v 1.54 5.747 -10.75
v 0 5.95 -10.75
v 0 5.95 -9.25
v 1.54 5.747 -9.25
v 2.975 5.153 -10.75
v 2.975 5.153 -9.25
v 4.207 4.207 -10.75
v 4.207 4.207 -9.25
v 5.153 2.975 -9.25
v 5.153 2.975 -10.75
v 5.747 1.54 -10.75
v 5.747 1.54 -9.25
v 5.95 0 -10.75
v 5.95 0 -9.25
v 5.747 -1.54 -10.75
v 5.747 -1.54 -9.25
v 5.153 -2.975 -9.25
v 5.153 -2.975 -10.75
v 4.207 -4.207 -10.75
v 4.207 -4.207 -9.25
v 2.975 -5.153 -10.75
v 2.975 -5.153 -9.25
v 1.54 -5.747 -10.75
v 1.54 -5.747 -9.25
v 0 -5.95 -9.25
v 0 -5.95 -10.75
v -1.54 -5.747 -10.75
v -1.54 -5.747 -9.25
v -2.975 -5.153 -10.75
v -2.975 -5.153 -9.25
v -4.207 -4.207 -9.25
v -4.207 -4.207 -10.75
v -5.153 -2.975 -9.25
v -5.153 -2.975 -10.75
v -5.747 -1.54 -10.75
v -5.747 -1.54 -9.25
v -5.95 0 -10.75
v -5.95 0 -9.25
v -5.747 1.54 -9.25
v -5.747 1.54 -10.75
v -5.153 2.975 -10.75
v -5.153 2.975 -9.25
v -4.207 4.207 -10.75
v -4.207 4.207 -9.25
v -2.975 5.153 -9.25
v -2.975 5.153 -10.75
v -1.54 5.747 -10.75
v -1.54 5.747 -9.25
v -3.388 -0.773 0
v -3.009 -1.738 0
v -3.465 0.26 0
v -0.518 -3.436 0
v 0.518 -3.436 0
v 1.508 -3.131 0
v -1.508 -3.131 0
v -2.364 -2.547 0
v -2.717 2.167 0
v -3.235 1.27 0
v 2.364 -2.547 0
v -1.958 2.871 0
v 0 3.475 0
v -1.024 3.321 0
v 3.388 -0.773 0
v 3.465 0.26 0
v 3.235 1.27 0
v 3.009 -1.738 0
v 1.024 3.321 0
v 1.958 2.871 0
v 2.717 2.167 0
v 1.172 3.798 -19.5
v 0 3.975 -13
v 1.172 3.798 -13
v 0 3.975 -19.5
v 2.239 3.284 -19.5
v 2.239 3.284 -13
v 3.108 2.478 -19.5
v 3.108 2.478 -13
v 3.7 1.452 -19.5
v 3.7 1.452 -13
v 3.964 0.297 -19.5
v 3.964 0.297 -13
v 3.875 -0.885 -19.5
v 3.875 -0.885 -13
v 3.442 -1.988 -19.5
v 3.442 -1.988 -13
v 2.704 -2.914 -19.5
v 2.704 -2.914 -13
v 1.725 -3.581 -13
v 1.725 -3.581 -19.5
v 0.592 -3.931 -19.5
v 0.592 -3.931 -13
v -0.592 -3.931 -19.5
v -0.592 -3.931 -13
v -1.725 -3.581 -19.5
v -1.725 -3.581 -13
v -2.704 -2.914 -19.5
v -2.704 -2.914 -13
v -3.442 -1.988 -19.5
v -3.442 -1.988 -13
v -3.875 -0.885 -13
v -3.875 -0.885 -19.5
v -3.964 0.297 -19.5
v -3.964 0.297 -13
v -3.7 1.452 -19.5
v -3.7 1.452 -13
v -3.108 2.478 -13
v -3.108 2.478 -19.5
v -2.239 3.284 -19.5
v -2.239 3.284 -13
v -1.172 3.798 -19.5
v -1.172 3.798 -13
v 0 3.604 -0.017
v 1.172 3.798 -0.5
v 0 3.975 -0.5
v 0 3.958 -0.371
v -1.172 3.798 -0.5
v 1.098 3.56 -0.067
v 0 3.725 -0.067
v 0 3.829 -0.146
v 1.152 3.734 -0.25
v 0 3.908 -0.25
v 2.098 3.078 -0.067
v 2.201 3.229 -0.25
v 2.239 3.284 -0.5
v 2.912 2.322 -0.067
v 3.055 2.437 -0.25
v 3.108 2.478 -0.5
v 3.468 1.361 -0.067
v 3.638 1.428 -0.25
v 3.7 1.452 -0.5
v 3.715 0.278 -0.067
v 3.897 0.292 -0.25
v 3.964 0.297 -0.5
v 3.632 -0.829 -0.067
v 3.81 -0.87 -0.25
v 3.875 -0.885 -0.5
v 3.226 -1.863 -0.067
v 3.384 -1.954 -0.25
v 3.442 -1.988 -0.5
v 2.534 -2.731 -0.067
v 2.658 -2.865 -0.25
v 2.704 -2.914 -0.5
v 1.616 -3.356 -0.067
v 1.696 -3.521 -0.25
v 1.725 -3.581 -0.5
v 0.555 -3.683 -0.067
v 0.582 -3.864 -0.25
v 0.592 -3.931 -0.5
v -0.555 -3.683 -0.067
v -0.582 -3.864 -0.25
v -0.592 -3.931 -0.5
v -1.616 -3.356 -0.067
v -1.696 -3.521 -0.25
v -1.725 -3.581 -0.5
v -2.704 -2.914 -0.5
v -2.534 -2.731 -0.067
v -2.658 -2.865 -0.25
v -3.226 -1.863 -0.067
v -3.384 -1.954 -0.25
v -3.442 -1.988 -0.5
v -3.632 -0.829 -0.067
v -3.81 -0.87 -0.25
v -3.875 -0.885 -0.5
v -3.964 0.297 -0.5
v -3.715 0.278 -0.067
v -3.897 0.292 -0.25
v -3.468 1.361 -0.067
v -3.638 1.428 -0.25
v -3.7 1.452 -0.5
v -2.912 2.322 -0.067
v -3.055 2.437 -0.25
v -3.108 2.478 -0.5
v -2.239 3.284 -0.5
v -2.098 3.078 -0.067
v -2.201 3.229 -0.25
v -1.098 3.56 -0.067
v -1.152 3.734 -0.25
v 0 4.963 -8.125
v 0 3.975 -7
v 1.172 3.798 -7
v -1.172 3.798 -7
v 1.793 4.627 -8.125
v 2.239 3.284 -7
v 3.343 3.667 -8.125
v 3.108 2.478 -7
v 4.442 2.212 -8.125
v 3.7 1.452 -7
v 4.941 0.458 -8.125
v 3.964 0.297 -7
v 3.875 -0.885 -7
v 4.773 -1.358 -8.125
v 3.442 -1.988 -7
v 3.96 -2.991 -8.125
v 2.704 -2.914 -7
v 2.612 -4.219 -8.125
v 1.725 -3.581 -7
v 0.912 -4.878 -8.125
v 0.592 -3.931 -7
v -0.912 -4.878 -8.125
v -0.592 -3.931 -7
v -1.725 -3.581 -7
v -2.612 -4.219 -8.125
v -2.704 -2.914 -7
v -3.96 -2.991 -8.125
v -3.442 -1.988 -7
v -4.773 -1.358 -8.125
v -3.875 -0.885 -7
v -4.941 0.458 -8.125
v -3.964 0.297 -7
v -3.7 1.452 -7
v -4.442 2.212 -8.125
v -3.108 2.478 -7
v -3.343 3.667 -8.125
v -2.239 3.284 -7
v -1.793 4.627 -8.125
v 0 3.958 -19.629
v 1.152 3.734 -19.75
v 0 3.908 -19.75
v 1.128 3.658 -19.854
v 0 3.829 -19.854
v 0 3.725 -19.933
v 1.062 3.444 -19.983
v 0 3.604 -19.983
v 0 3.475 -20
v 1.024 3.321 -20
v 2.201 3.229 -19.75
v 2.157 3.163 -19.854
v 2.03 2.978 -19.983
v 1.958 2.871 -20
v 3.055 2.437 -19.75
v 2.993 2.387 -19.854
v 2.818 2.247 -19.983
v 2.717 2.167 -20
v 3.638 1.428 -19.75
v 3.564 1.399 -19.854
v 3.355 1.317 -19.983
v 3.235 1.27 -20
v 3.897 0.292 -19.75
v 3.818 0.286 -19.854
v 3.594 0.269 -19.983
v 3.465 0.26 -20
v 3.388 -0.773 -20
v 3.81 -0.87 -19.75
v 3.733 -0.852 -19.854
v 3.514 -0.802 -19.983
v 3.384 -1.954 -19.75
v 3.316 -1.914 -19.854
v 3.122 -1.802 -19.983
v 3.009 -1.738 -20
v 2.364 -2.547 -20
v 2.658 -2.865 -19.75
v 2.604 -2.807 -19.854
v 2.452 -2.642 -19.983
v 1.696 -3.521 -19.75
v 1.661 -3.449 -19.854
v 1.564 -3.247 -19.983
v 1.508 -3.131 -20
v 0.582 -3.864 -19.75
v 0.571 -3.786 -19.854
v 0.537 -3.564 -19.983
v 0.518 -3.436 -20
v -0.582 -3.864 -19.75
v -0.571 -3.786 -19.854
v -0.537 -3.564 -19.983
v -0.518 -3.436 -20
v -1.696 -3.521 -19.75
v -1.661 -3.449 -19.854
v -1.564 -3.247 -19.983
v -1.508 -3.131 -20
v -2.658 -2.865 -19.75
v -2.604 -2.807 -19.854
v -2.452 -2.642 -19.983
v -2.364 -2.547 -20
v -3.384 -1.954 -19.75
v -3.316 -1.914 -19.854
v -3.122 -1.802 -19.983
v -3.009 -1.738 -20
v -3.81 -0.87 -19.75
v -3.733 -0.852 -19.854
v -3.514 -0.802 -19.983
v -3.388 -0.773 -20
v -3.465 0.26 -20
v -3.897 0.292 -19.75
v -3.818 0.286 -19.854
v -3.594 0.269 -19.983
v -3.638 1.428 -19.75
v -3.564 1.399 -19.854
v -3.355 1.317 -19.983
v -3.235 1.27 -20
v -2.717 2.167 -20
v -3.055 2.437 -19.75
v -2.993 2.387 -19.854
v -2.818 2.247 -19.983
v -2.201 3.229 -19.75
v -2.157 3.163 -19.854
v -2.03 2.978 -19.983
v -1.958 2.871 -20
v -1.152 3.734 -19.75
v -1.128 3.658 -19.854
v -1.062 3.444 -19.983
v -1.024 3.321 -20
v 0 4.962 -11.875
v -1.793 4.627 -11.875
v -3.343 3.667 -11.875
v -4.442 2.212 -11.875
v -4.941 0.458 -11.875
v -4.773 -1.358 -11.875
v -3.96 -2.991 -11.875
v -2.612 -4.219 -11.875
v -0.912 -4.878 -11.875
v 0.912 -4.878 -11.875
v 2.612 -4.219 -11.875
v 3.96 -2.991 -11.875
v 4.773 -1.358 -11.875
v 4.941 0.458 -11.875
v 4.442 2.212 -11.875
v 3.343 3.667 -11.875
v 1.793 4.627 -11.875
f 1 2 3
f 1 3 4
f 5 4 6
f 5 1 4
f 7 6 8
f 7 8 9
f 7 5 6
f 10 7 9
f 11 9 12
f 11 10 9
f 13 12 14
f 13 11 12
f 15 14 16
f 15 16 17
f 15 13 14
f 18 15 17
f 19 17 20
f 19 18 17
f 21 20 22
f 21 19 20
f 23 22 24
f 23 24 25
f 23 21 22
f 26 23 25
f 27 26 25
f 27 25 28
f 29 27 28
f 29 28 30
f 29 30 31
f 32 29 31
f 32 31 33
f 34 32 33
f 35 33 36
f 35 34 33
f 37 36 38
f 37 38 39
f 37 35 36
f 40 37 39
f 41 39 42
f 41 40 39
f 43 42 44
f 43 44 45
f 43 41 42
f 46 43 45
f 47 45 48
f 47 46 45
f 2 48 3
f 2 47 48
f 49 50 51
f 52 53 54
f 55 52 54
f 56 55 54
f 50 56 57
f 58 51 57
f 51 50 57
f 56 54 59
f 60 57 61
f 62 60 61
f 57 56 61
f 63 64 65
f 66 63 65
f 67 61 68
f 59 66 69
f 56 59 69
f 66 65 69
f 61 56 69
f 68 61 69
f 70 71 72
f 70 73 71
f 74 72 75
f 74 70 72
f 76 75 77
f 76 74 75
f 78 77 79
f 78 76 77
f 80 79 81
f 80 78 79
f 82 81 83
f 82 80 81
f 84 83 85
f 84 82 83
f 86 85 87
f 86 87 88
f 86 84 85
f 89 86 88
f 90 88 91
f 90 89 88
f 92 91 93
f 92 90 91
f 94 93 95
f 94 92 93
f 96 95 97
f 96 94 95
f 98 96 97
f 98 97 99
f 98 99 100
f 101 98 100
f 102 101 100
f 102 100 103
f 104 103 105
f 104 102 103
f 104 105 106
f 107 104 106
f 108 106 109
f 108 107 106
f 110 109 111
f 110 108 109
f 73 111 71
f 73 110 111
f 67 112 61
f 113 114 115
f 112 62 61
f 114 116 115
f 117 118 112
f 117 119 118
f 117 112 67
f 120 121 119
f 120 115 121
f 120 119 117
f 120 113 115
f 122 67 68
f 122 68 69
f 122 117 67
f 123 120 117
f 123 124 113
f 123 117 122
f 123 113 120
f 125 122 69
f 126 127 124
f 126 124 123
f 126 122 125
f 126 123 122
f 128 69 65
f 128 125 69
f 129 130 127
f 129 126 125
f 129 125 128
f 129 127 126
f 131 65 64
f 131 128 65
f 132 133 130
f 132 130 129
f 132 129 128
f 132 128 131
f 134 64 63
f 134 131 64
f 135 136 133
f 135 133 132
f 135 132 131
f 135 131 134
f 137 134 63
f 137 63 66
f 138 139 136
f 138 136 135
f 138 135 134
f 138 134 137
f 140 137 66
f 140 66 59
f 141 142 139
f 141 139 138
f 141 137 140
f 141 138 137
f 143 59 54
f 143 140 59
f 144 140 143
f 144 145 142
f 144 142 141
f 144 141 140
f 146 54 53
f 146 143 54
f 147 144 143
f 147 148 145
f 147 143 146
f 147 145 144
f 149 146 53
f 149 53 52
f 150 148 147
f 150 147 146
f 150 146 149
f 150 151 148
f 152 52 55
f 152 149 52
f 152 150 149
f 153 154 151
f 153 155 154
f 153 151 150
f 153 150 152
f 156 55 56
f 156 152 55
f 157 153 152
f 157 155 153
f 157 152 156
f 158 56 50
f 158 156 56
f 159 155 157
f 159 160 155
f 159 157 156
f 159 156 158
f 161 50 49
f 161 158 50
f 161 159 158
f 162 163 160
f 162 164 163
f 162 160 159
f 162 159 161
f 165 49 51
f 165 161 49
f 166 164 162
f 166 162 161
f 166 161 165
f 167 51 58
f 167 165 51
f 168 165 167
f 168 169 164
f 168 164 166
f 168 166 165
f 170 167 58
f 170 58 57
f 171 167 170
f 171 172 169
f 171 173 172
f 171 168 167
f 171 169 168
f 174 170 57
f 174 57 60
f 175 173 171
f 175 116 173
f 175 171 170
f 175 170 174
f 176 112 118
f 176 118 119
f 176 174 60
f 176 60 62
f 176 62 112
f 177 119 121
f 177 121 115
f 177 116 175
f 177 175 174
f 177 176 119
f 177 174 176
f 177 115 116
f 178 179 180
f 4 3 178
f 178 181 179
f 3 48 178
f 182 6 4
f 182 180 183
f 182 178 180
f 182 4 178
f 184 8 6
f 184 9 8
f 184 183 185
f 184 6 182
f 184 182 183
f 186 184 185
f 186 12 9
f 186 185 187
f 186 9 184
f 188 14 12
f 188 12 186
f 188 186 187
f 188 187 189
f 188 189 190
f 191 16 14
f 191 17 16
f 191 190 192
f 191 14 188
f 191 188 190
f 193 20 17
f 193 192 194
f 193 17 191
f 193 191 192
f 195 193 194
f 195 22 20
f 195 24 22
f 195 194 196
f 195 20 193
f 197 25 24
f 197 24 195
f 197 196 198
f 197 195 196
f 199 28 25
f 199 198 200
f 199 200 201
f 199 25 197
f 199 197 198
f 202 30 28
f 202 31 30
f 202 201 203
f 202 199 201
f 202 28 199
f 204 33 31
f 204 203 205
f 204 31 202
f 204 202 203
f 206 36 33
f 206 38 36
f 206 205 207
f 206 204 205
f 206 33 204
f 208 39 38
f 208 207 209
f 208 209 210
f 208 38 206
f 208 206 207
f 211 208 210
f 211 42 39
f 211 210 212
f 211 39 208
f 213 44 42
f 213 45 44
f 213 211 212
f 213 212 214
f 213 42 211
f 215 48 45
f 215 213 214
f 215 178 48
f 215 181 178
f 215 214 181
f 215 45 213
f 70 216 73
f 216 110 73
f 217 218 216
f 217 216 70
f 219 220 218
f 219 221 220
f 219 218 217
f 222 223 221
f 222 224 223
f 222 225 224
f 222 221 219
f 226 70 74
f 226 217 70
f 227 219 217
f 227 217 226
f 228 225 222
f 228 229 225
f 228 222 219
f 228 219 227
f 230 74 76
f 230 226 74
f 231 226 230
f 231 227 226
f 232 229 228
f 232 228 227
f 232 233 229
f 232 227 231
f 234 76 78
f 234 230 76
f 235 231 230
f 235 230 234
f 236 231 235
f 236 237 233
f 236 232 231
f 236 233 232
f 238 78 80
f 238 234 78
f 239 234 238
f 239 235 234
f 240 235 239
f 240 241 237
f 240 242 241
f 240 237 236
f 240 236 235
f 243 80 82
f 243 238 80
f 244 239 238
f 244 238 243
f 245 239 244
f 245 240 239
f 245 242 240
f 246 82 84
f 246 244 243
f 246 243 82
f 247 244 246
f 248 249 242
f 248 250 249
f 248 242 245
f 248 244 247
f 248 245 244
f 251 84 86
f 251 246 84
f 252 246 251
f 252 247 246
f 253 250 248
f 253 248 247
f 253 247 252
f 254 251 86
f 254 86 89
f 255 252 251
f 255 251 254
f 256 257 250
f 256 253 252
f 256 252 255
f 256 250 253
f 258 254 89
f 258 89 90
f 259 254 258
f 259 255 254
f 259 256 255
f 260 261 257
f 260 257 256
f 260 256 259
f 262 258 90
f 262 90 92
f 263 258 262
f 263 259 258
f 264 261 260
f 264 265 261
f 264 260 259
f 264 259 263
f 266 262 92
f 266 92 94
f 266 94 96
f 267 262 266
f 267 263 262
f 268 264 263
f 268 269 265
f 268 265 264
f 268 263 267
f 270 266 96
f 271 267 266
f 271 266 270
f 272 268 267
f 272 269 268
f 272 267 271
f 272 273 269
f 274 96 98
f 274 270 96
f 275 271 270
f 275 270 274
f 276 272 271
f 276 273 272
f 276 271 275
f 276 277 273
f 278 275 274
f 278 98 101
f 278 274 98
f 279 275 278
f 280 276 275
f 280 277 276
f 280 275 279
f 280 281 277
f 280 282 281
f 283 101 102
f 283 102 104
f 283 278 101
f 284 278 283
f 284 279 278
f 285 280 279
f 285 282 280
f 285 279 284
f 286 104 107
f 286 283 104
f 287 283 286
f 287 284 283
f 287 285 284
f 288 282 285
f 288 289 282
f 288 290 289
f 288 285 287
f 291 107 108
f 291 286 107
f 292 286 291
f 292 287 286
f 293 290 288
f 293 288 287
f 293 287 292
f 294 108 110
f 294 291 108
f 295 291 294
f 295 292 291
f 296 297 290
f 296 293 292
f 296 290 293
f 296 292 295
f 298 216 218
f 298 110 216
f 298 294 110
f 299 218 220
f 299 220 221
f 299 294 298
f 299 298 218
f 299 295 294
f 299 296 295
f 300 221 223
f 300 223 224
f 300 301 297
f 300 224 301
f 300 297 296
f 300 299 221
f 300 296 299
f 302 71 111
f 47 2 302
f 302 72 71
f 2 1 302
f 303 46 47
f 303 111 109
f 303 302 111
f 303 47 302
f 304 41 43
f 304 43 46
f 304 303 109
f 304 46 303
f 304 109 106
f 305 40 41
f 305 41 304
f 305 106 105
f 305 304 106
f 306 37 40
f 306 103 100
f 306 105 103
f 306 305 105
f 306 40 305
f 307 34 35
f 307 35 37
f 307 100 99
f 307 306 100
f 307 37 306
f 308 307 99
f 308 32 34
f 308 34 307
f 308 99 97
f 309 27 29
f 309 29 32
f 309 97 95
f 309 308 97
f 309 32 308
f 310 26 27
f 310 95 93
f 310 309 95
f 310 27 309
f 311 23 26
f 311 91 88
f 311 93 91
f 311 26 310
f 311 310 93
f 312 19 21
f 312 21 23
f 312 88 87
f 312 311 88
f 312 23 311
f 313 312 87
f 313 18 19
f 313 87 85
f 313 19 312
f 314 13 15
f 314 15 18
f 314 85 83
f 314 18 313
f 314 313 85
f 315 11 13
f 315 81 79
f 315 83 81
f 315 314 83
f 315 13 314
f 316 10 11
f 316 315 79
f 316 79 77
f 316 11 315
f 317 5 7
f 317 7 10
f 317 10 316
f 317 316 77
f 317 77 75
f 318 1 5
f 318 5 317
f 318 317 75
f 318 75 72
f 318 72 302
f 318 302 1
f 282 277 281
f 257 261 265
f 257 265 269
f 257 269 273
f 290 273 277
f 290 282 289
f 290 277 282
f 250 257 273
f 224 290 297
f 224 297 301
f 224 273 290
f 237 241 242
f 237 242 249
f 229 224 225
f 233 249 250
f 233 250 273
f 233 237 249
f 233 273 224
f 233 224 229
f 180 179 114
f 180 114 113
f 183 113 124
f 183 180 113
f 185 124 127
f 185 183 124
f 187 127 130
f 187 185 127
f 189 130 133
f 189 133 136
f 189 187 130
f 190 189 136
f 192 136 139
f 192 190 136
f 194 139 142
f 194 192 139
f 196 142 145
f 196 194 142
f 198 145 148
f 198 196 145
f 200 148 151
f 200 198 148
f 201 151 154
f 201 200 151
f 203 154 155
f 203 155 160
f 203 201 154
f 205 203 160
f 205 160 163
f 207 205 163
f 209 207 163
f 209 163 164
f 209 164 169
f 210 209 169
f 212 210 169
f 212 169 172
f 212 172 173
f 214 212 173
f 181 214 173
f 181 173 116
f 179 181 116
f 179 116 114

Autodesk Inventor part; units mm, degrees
ref_plane "YZ Plane" through (0, 0, 0) normal (1, 0, 0) x (0, 1, 0)
ref_plane "XZ Plane" through (0, 0, 0) normal (0, 1, 0) x (-1, 0, 0)
ref_plane "XY Plane" through (0, 0, 0) normal (0, 0, 1) x (1, 0, 0)
sketch "Sketch1" plane through (0, 0, 0) normal (1, 0, 0) x (0, 1, 0)
  line L0 (0, 0) -> (0, -20)
  line L1 (0, 0) -> (3.975, 0)
  line L2 (3.975, 0) -> (3.975, -7)
  line L3 (3.975, -7) -> (5.95, -9.25)
  line L4 (5.95, -9.25) -> (5.95, -10.75)
  line L5 (5.95, -10.75) -> (3.975, -13)
  line L6 (3.975, -13) -> (3.975, -20)
  line L7 (3.975, -20) -> (0, -20)
  dimension "d0" = 7.95
  dimension "d1" = 20
  dimension "d2" = 6
  dimension "d3" = 1.5
  dimension "d4" = 11.9
revolve "Revolution1" add sketch "Sketch1" angle 360 about axis through (0, 0, 0) along (0, 0, -1)
fillet "Fillet1" radius 0.5 2 edges at (0, -3.975, 0) (0, -3.975, -20)
properties part number "RailPlug" material "ABS Plastic"
